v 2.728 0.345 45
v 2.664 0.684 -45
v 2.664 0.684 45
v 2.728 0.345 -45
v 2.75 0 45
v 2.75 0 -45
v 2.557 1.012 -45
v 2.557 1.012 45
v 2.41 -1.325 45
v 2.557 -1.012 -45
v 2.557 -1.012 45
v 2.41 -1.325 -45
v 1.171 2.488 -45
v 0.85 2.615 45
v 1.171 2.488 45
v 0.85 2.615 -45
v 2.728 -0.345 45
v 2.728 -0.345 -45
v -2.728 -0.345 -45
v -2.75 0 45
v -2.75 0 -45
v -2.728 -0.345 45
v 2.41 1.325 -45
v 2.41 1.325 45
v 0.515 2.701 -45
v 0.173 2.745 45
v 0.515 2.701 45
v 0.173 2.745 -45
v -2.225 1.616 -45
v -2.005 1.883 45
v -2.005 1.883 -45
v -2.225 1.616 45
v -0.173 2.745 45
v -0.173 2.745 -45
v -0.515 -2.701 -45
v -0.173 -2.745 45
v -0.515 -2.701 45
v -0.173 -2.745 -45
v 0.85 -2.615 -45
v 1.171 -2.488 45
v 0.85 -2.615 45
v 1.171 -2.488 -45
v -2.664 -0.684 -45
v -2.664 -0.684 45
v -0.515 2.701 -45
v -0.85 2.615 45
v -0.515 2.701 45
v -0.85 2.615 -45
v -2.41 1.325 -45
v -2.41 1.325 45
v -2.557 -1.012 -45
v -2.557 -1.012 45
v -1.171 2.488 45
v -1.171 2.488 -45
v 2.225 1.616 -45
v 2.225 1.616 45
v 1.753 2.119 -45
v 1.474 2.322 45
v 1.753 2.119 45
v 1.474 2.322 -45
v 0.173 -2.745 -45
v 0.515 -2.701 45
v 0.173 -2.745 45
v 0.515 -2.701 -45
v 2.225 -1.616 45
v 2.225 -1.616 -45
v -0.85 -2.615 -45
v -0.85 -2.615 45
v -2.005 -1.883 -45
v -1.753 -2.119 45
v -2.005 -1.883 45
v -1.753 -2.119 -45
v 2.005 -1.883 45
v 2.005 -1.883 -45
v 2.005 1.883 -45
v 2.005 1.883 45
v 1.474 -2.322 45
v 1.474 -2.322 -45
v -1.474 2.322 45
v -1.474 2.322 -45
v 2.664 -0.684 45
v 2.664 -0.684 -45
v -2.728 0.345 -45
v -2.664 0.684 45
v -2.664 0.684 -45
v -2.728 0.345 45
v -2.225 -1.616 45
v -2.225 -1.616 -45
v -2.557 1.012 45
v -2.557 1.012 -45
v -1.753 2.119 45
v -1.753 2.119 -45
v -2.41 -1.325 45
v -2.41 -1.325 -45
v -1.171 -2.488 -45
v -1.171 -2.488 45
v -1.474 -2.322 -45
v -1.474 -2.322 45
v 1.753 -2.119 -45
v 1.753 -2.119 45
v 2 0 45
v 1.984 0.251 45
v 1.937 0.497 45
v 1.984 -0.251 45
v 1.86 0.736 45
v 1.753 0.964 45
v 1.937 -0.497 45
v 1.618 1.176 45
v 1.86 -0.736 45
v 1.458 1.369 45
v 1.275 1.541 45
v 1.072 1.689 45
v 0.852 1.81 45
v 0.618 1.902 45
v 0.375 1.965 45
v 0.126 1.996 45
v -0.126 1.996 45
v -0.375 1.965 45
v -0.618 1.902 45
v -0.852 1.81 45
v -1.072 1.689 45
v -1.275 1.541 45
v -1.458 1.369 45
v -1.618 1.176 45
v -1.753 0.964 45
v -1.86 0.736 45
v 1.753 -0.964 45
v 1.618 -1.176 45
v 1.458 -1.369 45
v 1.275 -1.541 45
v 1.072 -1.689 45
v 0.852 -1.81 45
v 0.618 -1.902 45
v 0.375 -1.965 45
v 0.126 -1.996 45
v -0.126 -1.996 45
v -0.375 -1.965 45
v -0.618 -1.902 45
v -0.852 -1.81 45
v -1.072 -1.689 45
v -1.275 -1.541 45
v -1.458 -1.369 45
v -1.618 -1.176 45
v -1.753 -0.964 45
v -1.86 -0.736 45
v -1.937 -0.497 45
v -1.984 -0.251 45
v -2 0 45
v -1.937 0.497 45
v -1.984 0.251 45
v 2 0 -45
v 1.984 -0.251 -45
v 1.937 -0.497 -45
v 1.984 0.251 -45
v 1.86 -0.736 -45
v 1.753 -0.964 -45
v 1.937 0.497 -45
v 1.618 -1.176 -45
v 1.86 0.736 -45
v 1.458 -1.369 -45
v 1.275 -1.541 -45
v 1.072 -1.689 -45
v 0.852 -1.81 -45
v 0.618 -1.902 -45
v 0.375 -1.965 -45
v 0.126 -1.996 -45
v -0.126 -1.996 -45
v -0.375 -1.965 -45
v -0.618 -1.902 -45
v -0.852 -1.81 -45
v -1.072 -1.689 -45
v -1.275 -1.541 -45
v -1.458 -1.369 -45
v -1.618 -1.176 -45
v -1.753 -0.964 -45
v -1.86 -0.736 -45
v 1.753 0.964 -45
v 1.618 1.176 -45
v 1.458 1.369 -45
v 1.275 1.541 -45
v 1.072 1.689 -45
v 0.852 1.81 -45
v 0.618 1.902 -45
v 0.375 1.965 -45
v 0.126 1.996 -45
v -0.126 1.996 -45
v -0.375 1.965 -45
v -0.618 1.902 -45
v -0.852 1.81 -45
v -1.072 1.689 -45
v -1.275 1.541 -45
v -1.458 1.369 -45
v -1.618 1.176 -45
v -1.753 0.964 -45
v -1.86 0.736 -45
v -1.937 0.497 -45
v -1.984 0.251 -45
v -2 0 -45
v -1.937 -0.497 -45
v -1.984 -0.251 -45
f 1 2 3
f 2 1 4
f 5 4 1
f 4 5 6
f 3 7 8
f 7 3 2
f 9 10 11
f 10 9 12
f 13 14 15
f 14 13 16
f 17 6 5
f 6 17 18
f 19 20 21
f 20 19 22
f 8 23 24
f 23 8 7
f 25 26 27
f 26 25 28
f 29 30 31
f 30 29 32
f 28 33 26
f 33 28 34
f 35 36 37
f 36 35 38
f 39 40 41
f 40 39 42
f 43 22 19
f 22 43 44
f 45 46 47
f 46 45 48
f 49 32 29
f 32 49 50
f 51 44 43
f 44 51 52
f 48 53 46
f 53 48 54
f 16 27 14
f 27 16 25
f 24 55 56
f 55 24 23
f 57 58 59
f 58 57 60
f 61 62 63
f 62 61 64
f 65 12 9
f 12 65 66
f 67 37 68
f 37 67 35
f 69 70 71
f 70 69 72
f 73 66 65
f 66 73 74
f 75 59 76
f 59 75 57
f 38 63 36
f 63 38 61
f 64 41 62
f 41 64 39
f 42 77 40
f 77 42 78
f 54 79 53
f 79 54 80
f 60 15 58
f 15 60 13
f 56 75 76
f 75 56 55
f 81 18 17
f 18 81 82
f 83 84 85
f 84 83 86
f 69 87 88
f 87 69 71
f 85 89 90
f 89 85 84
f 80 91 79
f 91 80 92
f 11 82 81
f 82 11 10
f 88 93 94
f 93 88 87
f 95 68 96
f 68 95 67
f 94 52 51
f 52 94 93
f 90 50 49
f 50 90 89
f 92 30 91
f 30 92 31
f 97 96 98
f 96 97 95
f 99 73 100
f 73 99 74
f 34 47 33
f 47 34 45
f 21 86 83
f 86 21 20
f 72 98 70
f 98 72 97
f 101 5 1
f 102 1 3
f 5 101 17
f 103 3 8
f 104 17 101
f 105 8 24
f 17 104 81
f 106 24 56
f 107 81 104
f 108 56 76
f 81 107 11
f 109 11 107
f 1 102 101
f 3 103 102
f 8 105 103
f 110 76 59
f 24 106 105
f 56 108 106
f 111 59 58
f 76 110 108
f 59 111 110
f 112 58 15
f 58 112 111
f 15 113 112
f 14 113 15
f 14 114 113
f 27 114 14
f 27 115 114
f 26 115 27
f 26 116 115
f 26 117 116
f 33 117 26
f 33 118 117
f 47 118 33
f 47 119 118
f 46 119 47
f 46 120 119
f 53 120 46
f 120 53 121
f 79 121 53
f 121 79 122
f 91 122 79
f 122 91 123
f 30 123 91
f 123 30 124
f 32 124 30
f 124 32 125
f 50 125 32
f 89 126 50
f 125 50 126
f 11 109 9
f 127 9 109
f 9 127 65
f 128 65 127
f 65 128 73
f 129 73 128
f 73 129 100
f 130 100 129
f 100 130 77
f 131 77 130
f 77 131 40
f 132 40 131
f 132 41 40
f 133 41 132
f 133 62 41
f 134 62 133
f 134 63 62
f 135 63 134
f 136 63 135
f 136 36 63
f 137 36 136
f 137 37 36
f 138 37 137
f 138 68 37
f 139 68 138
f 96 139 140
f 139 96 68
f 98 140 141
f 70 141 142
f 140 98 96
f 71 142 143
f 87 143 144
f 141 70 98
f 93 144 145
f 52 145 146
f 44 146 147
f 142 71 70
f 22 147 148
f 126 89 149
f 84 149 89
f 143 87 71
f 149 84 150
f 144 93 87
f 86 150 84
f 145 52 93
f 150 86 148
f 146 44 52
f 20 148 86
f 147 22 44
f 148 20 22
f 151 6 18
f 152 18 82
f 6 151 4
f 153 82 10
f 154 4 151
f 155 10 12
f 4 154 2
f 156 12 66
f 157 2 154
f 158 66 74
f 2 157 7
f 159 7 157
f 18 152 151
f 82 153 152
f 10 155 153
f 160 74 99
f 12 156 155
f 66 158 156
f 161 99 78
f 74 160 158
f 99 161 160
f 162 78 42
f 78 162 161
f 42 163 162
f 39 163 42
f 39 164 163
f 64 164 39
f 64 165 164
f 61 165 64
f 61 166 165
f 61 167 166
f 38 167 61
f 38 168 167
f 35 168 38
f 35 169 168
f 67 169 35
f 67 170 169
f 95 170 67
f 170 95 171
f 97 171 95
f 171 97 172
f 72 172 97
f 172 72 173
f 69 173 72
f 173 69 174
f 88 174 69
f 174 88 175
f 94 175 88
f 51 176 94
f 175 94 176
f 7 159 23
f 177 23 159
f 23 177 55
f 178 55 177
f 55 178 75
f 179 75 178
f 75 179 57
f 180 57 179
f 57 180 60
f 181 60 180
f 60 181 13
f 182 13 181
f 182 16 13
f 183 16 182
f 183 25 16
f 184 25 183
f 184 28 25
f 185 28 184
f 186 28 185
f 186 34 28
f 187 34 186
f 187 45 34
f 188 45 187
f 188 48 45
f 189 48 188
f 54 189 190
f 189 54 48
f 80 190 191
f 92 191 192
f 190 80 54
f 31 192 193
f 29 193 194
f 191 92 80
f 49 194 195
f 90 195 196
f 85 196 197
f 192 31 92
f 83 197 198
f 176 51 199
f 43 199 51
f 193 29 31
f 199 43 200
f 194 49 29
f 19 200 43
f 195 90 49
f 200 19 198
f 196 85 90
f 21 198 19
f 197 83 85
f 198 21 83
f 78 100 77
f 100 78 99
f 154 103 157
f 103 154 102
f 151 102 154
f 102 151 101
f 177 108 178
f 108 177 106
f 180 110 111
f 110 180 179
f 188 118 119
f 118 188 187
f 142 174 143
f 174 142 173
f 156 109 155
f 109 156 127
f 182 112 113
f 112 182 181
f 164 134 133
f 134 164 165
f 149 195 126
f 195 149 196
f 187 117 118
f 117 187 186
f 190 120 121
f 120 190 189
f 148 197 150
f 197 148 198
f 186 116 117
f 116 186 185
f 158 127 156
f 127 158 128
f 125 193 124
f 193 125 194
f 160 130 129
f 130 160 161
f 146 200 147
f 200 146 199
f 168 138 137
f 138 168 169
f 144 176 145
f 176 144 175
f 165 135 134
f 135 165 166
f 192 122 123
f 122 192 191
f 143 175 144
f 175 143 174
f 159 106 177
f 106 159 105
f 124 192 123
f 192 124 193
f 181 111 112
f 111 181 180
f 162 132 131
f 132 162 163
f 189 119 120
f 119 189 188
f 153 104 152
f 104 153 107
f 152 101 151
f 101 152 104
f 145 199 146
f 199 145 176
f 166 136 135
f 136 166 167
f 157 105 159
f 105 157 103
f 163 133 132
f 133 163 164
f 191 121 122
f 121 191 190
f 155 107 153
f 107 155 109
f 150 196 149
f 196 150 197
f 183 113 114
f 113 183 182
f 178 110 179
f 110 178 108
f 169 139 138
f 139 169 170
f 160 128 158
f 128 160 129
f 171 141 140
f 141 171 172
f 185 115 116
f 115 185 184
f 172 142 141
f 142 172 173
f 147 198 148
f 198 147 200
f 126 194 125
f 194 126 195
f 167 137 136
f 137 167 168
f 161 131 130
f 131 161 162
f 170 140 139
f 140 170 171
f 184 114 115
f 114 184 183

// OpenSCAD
$fn = 50;


difference() {
	union() {
		translate(v = [0, 0, -45.0000000000]) {
			cylinder(h = 90, r = 2.7500000000);
		}
	}
	union() {
		translate(v = [0, 0, -100.0000000000]) {
			cylinder(h = 200, r = 2.0000000000);
		}
	}
}
